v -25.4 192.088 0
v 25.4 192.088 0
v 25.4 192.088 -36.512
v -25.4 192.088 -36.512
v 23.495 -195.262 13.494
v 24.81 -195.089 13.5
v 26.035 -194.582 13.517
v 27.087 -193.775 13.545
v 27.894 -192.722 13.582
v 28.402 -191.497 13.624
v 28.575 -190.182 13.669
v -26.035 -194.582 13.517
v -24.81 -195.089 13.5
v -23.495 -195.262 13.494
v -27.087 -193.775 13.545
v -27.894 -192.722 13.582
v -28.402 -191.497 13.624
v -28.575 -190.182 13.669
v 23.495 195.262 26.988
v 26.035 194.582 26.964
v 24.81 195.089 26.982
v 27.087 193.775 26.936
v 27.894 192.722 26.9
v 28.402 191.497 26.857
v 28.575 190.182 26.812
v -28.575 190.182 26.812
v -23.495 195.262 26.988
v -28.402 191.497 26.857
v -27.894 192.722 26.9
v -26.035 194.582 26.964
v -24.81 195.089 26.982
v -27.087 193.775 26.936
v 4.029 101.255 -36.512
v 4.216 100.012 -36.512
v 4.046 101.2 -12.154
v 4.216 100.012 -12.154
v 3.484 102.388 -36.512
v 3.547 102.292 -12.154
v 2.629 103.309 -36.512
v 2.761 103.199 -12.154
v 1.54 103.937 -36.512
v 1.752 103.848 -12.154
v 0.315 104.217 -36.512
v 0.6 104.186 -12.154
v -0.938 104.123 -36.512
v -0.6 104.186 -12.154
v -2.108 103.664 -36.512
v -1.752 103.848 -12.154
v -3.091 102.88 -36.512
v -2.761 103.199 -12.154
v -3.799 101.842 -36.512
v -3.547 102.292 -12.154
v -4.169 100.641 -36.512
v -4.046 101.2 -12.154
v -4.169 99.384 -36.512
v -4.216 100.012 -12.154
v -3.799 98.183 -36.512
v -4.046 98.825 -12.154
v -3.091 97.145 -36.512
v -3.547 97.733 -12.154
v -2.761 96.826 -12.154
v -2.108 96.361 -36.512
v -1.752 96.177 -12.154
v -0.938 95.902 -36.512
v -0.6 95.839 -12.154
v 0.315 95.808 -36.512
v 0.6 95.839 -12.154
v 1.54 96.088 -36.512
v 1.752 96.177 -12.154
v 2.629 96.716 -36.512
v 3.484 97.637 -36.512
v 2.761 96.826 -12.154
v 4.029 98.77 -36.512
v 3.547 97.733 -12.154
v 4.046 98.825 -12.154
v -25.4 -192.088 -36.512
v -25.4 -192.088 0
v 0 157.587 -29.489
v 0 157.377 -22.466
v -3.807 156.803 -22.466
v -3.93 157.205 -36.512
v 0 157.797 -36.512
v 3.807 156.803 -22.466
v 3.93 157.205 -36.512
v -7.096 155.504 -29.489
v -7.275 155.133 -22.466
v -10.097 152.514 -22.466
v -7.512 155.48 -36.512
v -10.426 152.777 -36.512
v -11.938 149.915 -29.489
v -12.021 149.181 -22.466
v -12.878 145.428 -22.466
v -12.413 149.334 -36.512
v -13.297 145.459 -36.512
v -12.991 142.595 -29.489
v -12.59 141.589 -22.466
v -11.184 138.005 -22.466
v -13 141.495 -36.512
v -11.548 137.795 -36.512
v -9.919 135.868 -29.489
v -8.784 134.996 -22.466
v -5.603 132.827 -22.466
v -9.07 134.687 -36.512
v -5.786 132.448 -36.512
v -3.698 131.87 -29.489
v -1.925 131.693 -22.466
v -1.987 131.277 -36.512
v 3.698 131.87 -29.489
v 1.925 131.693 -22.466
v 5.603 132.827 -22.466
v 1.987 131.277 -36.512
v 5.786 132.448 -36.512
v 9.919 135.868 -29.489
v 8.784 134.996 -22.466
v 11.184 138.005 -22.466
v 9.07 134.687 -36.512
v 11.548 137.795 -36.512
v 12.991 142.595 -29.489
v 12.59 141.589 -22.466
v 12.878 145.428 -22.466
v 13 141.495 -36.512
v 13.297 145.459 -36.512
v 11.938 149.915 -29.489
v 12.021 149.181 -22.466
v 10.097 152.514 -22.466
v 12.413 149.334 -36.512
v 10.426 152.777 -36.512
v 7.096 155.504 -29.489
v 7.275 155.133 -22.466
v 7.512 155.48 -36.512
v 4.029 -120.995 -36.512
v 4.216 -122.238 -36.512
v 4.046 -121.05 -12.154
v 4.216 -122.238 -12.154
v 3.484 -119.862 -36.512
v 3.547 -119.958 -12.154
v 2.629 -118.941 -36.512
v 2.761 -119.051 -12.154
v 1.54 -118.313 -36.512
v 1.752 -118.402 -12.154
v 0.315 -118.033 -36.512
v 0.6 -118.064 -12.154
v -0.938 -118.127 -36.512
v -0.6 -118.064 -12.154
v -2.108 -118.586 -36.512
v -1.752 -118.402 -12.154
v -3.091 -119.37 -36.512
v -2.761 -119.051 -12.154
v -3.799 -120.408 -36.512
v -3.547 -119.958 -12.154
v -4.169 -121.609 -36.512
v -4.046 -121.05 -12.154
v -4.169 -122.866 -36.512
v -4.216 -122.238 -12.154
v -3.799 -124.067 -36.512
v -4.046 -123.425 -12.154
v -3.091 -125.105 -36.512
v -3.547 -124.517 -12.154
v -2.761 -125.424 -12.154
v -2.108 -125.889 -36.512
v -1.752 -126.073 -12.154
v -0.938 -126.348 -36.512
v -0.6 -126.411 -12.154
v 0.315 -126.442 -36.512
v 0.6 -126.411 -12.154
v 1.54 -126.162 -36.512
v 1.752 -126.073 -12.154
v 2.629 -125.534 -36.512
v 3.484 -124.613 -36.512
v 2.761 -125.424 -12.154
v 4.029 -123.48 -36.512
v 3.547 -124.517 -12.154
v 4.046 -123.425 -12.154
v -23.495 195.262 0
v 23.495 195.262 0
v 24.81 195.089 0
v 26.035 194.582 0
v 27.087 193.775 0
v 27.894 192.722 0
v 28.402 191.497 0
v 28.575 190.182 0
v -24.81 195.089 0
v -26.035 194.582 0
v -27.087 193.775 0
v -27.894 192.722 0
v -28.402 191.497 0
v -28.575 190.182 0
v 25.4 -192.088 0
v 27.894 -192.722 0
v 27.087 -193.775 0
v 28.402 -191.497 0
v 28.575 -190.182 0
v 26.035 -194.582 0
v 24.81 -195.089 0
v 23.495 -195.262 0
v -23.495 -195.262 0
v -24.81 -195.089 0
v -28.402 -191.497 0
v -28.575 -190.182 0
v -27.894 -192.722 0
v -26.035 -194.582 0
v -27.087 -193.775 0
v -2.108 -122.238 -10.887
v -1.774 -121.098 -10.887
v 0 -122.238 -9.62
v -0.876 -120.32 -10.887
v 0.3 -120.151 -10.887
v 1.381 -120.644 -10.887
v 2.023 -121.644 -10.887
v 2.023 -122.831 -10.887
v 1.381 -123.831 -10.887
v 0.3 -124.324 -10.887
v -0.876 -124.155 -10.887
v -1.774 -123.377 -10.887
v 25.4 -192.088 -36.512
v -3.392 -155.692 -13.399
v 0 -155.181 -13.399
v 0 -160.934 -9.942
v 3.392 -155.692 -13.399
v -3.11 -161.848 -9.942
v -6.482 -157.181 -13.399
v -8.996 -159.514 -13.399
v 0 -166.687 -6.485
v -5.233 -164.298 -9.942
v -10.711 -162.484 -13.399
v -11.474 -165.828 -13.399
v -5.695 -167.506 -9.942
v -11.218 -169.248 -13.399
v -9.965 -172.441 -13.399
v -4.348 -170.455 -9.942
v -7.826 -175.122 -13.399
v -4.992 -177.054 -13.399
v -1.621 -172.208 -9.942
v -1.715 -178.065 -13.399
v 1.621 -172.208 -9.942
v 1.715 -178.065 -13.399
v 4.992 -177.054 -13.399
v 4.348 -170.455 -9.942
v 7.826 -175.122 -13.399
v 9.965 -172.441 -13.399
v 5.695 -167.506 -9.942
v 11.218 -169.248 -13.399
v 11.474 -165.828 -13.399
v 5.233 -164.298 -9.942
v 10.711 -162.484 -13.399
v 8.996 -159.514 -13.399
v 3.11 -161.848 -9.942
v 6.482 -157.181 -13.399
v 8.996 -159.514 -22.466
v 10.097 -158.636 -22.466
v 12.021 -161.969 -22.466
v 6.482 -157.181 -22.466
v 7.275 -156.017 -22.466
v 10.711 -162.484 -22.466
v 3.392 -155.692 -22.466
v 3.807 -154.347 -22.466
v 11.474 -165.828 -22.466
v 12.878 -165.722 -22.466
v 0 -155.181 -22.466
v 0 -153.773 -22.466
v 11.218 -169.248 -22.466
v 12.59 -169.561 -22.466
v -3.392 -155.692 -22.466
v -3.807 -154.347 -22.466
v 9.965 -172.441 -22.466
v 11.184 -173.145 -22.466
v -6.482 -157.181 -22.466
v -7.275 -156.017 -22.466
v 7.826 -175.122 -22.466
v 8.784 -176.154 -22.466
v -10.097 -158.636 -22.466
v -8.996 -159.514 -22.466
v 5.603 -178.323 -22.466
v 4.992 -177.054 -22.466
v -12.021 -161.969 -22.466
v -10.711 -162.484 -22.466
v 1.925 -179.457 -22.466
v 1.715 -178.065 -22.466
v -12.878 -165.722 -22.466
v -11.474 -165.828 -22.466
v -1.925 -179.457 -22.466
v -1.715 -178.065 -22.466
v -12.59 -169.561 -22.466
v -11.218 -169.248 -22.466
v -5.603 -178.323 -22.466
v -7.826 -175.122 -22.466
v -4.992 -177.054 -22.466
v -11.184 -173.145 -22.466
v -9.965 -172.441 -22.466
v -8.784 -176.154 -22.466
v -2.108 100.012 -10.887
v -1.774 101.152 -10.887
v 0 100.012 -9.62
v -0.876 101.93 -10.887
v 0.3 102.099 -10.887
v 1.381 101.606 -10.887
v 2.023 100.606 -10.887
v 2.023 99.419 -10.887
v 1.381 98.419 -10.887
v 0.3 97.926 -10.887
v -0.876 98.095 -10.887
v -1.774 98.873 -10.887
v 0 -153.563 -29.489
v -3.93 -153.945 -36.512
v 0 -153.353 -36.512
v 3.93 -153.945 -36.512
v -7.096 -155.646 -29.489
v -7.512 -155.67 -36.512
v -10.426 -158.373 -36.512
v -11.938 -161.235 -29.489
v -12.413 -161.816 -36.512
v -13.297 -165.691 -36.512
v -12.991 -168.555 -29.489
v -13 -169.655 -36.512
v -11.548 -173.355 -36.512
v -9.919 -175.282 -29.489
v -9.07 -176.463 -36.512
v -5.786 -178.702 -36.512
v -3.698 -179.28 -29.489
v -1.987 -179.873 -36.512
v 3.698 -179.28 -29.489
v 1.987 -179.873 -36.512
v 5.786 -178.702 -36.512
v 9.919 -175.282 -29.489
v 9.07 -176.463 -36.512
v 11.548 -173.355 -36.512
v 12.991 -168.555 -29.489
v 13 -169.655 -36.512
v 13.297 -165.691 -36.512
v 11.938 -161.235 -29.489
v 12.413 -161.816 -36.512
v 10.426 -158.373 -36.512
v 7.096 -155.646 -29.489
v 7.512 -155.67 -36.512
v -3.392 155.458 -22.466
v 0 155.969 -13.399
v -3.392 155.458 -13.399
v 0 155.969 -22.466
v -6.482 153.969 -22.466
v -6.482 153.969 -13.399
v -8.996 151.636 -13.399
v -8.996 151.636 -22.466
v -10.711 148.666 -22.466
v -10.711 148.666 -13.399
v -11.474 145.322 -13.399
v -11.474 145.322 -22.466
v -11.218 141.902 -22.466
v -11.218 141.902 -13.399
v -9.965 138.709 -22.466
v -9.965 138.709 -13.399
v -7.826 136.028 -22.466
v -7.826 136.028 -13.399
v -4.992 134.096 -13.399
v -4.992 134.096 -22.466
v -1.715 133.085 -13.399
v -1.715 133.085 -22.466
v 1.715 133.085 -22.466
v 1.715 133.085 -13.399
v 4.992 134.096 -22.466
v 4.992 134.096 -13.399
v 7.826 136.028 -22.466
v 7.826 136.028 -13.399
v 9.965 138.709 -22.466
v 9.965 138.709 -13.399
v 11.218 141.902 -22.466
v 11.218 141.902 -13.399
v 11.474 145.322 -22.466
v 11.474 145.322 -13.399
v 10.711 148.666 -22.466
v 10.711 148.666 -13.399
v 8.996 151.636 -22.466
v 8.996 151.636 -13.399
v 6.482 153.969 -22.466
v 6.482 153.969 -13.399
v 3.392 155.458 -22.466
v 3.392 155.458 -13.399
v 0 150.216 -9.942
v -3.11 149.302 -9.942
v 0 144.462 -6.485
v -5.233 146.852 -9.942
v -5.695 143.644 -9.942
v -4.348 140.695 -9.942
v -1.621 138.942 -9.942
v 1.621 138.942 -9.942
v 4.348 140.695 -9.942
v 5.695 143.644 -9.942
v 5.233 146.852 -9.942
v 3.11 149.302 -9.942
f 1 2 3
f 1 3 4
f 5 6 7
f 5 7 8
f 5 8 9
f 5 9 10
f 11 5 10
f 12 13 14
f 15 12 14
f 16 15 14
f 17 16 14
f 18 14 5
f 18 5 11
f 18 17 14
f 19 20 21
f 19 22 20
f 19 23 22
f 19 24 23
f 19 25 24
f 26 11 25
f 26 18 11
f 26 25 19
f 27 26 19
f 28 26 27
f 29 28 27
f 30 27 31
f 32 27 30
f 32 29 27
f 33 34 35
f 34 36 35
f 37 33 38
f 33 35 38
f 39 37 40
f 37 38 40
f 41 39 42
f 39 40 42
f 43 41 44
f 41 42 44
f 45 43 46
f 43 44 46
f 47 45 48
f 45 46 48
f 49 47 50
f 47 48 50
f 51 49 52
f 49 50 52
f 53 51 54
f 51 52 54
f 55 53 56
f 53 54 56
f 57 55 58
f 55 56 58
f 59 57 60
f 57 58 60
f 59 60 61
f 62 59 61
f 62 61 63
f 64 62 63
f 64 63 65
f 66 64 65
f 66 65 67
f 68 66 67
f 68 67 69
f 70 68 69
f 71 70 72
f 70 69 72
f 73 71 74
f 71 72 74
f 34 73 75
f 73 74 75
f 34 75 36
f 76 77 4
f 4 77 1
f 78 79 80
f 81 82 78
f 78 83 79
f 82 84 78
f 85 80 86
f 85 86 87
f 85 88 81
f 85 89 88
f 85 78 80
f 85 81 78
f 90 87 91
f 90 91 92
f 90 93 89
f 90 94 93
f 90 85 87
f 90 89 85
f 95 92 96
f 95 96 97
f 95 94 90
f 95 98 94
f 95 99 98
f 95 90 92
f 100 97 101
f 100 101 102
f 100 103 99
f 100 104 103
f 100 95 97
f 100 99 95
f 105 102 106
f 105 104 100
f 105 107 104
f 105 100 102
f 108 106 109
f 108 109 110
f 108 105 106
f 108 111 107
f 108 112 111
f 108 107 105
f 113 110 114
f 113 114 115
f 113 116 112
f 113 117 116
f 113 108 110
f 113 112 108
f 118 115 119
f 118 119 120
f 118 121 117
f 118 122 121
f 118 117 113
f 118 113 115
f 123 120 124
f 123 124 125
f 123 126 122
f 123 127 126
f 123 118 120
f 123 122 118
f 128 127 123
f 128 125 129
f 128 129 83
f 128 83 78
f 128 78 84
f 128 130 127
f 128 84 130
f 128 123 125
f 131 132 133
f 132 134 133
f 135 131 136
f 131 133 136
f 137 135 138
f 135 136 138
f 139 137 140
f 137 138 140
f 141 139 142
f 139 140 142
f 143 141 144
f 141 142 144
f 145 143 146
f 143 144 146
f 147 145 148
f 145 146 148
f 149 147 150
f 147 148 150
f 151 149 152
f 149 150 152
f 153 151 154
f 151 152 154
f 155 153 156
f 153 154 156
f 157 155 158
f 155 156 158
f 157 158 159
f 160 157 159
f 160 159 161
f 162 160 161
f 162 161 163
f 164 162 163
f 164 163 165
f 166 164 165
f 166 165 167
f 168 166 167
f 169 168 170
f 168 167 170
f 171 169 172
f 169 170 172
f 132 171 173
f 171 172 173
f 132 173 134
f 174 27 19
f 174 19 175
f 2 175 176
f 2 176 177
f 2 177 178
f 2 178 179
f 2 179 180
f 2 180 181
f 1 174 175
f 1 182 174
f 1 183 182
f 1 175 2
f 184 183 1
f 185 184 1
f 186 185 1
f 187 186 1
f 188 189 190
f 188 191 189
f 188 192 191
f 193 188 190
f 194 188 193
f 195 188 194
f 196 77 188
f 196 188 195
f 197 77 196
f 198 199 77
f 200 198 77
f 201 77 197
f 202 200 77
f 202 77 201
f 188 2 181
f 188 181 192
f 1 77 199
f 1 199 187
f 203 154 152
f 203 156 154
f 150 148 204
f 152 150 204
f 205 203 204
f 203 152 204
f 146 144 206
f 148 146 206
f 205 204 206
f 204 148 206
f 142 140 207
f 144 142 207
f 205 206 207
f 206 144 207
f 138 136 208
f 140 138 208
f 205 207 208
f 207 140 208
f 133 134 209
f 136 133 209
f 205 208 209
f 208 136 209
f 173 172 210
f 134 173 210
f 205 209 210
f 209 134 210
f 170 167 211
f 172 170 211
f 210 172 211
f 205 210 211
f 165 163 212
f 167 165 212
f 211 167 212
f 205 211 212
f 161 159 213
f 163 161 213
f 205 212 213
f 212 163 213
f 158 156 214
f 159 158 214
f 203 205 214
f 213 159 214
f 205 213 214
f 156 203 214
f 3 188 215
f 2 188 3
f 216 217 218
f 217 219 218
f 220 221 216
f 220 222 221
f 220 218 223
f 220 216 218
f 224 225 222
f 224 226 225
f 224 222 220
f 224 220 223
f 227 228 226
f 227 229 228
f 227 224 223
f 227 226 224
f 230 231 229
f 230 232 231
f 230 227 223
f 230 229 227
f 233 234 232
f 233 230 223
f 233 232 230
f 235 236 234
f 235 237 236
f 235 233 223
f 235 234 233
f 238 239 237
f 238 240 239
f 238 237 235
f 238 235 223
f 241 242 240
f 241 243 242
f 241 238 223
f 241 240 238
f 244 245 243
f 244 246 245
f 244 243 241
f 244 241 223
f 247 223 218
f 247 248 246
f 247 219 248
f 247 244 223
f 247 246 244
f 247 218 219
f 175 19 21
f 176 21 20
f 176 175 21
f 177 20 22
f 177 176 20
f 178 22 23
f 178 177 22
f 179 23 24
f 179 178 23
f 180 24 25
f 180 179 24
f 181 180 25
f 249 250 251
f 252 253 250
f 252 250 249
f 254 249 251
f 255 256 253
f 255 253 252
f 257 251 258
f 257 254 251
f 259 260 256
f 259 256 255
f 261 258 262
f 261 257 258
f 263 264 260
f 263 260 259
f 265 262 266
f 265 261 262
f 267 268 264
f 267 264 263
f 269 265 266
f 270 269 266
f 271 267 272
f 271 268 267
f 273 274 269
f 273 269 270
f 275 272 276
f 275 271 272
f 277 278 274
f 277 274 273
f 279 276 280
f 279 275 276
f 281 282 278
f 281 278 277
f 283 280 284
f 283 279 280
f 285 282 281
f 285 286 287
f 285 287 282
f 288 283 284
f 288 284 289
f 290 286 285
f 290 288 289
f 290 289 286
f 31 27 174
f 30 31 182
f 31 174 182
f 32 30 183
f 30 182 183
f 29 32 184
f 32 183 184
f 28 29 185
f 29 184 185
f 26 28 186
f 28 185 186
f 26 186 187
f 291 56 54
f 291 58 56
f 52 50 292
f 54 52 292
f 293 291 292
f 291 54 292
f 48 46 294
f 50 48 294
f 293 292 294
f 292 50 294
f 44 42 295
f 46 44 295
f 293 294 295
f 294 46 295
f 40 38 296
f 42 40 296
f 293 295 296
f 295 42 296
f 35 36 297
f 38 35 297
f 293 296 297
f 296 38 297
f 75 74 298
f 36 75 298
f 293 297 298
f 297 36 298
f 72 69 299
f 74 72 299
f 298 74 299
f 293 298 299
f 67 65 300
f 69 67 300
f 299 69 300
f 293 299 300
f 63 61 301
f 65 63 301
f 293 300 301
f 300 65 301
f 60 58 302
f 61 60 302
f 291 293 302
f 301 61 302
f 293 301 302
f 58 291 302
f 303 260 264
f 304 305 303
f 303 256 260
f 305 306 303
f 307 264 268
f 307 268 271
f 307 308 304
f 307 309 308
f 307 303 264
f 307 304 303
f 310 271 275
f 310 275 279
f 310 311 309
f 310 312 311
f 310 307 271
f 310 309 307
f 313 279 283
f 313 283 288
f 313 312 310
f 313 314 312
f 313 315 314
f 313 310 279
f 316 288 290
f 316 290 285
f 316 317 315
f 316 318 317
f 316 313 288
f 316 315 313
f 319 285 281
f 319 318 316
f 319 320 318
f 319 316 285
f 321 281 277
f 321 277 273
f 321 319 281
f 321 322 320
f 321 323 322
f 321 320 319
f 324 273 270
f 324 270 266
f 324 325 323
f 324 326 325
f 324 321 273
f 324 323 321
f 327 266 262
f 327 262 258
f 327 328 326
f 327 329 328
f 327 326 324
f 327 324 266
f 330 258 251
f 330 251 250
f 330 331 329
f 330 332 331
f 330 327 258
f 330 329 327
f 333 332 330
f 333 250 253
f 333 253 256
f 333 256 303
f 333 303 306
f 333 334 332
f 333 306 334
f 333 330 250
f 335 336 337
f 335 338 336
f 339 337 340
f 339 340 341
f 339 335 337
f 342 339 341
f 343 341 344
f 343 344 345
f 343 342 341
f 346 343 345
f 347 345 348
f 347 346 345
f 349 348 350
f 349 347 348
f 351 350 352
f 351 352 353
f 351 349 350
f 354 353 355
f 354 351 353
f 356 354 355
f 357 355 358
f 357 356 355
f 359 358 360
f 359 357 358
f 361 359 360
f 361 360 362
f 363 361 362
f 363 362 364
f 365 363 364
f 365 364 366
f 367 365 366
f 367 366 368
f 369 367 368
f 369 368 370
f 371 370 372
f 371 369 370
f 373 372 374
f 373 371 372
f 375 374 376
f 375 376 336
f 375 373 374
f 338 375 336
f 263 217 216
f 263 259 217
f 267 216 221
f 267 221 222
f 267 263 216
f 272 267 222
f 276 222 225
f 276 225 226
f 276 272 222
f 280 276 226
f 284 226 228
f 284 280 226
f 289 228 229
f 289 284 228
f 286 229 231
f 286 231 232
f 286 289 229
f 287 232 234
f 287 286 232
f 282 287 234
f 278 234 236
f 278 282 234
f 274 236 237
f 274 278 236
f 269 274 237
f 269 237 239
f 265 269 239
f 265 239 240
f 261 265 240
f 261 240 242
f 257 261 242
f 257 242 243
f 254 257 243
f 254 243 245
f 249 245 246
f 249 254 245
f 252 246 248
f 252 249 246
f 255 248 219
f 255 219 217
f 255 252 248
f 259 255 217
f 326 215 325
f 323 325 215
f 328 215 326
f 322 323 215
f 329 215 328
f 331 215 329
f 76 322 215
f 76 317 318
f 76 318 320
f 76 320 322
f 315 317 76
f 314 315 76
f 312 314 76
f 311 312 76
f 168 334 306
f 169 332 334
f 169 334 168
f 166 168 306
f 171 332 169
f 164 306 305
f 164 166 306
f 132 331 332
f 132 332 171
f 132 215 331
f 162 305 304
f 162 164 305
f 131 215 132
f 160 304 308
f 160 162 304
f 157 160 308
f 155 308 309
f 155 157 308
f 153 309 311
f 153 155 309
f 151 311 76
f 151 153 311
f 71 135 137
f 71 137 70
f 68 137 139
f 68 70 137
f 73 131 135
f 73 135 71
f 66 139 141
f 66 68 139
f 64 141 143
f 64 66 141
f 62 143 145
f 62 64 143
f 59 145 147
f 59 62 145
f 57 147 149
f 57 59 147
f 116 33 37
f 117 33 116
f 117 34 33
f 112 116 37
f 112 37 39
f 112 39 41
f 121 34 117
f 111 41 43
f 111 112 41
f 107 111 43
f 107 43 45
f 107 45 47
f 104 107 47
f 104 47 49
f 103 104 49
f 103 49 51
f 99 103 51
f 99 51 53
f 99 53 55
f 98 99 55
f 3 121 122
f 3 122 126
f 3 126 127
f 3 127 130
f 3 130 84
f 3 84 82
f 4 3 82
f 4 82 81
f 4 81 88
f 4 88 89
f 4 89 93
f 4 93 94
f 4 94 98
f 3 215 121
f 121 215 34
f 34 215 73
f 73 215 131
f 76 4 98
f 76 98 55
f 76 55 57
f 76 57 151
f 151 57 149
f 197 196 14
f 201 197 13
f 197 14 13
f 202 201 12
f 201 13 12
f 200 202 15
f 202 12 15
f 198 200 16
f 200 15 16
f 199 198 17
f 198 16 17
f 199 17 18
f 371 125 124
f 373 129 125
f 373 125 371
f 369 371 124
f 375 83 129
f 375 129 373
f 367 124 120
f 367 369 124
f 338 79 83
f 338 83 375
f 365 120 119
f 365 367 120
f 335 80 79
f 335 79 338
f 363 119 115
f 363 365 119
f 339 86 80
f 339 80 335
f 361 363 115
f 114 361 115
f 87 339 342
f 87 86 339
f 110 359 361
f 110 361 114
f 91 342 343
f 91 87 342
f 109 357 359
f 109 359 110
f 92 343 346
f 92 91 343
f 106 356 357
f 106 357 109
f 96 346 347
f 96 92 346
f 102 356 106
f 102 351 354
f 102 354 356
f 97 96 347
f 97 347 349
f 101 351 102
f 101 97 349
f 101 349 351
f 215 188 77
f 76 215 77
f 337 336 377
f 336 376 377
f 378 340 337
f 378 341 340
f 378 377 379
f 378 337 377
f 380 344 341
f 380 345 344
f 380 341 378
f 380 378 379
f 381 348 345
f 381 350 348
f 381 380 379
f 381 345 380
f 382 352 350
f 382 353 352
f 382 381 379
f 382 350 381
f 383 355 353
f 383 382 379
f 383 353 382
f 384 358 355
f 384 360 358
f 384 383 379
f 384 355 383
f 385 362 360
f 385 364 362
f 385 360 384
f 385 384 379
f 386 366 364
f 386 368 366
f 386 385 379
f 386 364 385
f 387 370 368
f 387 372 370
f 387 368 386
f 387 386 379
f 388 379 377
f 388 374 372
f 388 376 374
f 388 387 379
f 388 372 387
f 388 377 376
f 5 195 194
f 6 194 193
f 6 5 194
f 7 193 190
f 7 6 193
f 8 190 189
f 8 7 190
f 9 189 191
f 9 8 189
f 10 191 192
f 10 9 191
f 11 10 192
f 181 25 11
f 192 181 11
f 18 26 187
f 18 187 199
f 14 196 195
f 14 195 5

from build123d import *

# Parameters (mm, degrees)
BOSS_EXTRUDE1_DEPTH               = 57.15
SKETCH15_W                        = 50.8
SKETCH15_H                        = 384.175
BOSS_EXTRUDE7_DEPTH               = 36.5125
M8_CLEARANCE_HOLE1_D              = 8.4328
M8_CLEARANCE_HOLE1_DEPTH          = 24.3586
M8_CLEARANCE_HOLE1_TIP            = 2.533468714
FILLET1_R                         = 5.08
F_3_4_NPT_TAPPED_HOLE1_AT_2_COUNT = 2
F_3_4_NPT_TAPPED_HOLE1_AT_2_PITCH = 311.15


with BuildPart() as part:
    # Sketch1 → Boss-Extrude1 (new body)
    with BuildSketch(Plane(origin=(-28.575, 0, 0), x_dir=(0, -1, 0), z_dir=(-1, 0, 0))):
        Polygon((195.2625, 13.49375), (-195.2625, 26.9875), (-195.2625, 0), (195.2625, 0), align=None)
    extrude(amount=-BOSS_EXTRUDE1_DEPTH)

    # Sketch15 → Boss-Extrude7 (add)
    with BuildSketch(Plane(origin=(0, 0, 0), x_dir=(-1, 0, 0), z_dir=(0, 0, -1))):
        Rectangle(SKETCH15_W, SKETCH15_H)
    extrude(amount=BOSS_EXTRUDE7_DEPTH)

    # M8 Clearance Hole1
    with Locations(Plane(origin=(0, 0, -36.5125), x_dir=(-1, 0, 0), z_dir=(0, 0, -1))):
        with Locations((0, 100.0125), (0, -122.2375)):
            Hole(M8_CLEARANCE_HOLE1_D / 2, depth=M8_CLEARANCE_HOLE1_DEPTH)
            with Locations((0, 0, -(M8_CLEARANCE_HOLE1_DEPTH + M8_CLEARANCE_HOLE1_TIP / 2))):  # 118° drill point
                Cone(0, M8_CLEARANCE_HOLE1_D / 2, M8_CLEARANCE_HOLE1_TIP, mode=Mode.SUBTRACT)

    # Fillet1
    fillet1_edges = [part.edges().sort_by_distance(p)[0] for p in [
        (28.575, 195.2625, 13.49375),
        (28.575, -195.2625, 6.746875),
        (-28.575, 195.2625, 13.49375),
        (-28.575, -195.2625, 6.746875),
    ]]
    fillet(fillet1_edges, radius=FILLET1_R)

    # Sketch27 → 3/4 NPT Tapped Hole1 (revolve, cut)
    with BuildSketch(Plane(origin=(0, 144.4625, -36.5125), x_dir=(0, 1, 0), z_dir=(1, 0, 0))):
        Polygon((0, 0), (0, 30.027622455), (11.5062, 23.114), (11.5062, 14.0462), (12.914209362, 14.0462), (13.3347714, 0), align=None)
    f_3_4_npt_tapped_hole1 = revolve(axis=Axis((0, 144.4625, -42.8625), (0, 0, 1)), mode=Mode.SUBTRACT)

    # 3/4 NPT Tapped Hole1 at 2: 3/4 NPT Tapped Hole1 ×2
    with Locations(*[(0, -i * F_3_4_NPT_TAPPED_HOLE1_AT_2_PITCH, 0) for i in range(1, F_3_4_NPT_TAPPED_HOLE1_AT_2_COUNT)]):
        add(f_3_4_npt_tapped_hole1, mode=Mode.SUBTRACT)


solid = part.part
